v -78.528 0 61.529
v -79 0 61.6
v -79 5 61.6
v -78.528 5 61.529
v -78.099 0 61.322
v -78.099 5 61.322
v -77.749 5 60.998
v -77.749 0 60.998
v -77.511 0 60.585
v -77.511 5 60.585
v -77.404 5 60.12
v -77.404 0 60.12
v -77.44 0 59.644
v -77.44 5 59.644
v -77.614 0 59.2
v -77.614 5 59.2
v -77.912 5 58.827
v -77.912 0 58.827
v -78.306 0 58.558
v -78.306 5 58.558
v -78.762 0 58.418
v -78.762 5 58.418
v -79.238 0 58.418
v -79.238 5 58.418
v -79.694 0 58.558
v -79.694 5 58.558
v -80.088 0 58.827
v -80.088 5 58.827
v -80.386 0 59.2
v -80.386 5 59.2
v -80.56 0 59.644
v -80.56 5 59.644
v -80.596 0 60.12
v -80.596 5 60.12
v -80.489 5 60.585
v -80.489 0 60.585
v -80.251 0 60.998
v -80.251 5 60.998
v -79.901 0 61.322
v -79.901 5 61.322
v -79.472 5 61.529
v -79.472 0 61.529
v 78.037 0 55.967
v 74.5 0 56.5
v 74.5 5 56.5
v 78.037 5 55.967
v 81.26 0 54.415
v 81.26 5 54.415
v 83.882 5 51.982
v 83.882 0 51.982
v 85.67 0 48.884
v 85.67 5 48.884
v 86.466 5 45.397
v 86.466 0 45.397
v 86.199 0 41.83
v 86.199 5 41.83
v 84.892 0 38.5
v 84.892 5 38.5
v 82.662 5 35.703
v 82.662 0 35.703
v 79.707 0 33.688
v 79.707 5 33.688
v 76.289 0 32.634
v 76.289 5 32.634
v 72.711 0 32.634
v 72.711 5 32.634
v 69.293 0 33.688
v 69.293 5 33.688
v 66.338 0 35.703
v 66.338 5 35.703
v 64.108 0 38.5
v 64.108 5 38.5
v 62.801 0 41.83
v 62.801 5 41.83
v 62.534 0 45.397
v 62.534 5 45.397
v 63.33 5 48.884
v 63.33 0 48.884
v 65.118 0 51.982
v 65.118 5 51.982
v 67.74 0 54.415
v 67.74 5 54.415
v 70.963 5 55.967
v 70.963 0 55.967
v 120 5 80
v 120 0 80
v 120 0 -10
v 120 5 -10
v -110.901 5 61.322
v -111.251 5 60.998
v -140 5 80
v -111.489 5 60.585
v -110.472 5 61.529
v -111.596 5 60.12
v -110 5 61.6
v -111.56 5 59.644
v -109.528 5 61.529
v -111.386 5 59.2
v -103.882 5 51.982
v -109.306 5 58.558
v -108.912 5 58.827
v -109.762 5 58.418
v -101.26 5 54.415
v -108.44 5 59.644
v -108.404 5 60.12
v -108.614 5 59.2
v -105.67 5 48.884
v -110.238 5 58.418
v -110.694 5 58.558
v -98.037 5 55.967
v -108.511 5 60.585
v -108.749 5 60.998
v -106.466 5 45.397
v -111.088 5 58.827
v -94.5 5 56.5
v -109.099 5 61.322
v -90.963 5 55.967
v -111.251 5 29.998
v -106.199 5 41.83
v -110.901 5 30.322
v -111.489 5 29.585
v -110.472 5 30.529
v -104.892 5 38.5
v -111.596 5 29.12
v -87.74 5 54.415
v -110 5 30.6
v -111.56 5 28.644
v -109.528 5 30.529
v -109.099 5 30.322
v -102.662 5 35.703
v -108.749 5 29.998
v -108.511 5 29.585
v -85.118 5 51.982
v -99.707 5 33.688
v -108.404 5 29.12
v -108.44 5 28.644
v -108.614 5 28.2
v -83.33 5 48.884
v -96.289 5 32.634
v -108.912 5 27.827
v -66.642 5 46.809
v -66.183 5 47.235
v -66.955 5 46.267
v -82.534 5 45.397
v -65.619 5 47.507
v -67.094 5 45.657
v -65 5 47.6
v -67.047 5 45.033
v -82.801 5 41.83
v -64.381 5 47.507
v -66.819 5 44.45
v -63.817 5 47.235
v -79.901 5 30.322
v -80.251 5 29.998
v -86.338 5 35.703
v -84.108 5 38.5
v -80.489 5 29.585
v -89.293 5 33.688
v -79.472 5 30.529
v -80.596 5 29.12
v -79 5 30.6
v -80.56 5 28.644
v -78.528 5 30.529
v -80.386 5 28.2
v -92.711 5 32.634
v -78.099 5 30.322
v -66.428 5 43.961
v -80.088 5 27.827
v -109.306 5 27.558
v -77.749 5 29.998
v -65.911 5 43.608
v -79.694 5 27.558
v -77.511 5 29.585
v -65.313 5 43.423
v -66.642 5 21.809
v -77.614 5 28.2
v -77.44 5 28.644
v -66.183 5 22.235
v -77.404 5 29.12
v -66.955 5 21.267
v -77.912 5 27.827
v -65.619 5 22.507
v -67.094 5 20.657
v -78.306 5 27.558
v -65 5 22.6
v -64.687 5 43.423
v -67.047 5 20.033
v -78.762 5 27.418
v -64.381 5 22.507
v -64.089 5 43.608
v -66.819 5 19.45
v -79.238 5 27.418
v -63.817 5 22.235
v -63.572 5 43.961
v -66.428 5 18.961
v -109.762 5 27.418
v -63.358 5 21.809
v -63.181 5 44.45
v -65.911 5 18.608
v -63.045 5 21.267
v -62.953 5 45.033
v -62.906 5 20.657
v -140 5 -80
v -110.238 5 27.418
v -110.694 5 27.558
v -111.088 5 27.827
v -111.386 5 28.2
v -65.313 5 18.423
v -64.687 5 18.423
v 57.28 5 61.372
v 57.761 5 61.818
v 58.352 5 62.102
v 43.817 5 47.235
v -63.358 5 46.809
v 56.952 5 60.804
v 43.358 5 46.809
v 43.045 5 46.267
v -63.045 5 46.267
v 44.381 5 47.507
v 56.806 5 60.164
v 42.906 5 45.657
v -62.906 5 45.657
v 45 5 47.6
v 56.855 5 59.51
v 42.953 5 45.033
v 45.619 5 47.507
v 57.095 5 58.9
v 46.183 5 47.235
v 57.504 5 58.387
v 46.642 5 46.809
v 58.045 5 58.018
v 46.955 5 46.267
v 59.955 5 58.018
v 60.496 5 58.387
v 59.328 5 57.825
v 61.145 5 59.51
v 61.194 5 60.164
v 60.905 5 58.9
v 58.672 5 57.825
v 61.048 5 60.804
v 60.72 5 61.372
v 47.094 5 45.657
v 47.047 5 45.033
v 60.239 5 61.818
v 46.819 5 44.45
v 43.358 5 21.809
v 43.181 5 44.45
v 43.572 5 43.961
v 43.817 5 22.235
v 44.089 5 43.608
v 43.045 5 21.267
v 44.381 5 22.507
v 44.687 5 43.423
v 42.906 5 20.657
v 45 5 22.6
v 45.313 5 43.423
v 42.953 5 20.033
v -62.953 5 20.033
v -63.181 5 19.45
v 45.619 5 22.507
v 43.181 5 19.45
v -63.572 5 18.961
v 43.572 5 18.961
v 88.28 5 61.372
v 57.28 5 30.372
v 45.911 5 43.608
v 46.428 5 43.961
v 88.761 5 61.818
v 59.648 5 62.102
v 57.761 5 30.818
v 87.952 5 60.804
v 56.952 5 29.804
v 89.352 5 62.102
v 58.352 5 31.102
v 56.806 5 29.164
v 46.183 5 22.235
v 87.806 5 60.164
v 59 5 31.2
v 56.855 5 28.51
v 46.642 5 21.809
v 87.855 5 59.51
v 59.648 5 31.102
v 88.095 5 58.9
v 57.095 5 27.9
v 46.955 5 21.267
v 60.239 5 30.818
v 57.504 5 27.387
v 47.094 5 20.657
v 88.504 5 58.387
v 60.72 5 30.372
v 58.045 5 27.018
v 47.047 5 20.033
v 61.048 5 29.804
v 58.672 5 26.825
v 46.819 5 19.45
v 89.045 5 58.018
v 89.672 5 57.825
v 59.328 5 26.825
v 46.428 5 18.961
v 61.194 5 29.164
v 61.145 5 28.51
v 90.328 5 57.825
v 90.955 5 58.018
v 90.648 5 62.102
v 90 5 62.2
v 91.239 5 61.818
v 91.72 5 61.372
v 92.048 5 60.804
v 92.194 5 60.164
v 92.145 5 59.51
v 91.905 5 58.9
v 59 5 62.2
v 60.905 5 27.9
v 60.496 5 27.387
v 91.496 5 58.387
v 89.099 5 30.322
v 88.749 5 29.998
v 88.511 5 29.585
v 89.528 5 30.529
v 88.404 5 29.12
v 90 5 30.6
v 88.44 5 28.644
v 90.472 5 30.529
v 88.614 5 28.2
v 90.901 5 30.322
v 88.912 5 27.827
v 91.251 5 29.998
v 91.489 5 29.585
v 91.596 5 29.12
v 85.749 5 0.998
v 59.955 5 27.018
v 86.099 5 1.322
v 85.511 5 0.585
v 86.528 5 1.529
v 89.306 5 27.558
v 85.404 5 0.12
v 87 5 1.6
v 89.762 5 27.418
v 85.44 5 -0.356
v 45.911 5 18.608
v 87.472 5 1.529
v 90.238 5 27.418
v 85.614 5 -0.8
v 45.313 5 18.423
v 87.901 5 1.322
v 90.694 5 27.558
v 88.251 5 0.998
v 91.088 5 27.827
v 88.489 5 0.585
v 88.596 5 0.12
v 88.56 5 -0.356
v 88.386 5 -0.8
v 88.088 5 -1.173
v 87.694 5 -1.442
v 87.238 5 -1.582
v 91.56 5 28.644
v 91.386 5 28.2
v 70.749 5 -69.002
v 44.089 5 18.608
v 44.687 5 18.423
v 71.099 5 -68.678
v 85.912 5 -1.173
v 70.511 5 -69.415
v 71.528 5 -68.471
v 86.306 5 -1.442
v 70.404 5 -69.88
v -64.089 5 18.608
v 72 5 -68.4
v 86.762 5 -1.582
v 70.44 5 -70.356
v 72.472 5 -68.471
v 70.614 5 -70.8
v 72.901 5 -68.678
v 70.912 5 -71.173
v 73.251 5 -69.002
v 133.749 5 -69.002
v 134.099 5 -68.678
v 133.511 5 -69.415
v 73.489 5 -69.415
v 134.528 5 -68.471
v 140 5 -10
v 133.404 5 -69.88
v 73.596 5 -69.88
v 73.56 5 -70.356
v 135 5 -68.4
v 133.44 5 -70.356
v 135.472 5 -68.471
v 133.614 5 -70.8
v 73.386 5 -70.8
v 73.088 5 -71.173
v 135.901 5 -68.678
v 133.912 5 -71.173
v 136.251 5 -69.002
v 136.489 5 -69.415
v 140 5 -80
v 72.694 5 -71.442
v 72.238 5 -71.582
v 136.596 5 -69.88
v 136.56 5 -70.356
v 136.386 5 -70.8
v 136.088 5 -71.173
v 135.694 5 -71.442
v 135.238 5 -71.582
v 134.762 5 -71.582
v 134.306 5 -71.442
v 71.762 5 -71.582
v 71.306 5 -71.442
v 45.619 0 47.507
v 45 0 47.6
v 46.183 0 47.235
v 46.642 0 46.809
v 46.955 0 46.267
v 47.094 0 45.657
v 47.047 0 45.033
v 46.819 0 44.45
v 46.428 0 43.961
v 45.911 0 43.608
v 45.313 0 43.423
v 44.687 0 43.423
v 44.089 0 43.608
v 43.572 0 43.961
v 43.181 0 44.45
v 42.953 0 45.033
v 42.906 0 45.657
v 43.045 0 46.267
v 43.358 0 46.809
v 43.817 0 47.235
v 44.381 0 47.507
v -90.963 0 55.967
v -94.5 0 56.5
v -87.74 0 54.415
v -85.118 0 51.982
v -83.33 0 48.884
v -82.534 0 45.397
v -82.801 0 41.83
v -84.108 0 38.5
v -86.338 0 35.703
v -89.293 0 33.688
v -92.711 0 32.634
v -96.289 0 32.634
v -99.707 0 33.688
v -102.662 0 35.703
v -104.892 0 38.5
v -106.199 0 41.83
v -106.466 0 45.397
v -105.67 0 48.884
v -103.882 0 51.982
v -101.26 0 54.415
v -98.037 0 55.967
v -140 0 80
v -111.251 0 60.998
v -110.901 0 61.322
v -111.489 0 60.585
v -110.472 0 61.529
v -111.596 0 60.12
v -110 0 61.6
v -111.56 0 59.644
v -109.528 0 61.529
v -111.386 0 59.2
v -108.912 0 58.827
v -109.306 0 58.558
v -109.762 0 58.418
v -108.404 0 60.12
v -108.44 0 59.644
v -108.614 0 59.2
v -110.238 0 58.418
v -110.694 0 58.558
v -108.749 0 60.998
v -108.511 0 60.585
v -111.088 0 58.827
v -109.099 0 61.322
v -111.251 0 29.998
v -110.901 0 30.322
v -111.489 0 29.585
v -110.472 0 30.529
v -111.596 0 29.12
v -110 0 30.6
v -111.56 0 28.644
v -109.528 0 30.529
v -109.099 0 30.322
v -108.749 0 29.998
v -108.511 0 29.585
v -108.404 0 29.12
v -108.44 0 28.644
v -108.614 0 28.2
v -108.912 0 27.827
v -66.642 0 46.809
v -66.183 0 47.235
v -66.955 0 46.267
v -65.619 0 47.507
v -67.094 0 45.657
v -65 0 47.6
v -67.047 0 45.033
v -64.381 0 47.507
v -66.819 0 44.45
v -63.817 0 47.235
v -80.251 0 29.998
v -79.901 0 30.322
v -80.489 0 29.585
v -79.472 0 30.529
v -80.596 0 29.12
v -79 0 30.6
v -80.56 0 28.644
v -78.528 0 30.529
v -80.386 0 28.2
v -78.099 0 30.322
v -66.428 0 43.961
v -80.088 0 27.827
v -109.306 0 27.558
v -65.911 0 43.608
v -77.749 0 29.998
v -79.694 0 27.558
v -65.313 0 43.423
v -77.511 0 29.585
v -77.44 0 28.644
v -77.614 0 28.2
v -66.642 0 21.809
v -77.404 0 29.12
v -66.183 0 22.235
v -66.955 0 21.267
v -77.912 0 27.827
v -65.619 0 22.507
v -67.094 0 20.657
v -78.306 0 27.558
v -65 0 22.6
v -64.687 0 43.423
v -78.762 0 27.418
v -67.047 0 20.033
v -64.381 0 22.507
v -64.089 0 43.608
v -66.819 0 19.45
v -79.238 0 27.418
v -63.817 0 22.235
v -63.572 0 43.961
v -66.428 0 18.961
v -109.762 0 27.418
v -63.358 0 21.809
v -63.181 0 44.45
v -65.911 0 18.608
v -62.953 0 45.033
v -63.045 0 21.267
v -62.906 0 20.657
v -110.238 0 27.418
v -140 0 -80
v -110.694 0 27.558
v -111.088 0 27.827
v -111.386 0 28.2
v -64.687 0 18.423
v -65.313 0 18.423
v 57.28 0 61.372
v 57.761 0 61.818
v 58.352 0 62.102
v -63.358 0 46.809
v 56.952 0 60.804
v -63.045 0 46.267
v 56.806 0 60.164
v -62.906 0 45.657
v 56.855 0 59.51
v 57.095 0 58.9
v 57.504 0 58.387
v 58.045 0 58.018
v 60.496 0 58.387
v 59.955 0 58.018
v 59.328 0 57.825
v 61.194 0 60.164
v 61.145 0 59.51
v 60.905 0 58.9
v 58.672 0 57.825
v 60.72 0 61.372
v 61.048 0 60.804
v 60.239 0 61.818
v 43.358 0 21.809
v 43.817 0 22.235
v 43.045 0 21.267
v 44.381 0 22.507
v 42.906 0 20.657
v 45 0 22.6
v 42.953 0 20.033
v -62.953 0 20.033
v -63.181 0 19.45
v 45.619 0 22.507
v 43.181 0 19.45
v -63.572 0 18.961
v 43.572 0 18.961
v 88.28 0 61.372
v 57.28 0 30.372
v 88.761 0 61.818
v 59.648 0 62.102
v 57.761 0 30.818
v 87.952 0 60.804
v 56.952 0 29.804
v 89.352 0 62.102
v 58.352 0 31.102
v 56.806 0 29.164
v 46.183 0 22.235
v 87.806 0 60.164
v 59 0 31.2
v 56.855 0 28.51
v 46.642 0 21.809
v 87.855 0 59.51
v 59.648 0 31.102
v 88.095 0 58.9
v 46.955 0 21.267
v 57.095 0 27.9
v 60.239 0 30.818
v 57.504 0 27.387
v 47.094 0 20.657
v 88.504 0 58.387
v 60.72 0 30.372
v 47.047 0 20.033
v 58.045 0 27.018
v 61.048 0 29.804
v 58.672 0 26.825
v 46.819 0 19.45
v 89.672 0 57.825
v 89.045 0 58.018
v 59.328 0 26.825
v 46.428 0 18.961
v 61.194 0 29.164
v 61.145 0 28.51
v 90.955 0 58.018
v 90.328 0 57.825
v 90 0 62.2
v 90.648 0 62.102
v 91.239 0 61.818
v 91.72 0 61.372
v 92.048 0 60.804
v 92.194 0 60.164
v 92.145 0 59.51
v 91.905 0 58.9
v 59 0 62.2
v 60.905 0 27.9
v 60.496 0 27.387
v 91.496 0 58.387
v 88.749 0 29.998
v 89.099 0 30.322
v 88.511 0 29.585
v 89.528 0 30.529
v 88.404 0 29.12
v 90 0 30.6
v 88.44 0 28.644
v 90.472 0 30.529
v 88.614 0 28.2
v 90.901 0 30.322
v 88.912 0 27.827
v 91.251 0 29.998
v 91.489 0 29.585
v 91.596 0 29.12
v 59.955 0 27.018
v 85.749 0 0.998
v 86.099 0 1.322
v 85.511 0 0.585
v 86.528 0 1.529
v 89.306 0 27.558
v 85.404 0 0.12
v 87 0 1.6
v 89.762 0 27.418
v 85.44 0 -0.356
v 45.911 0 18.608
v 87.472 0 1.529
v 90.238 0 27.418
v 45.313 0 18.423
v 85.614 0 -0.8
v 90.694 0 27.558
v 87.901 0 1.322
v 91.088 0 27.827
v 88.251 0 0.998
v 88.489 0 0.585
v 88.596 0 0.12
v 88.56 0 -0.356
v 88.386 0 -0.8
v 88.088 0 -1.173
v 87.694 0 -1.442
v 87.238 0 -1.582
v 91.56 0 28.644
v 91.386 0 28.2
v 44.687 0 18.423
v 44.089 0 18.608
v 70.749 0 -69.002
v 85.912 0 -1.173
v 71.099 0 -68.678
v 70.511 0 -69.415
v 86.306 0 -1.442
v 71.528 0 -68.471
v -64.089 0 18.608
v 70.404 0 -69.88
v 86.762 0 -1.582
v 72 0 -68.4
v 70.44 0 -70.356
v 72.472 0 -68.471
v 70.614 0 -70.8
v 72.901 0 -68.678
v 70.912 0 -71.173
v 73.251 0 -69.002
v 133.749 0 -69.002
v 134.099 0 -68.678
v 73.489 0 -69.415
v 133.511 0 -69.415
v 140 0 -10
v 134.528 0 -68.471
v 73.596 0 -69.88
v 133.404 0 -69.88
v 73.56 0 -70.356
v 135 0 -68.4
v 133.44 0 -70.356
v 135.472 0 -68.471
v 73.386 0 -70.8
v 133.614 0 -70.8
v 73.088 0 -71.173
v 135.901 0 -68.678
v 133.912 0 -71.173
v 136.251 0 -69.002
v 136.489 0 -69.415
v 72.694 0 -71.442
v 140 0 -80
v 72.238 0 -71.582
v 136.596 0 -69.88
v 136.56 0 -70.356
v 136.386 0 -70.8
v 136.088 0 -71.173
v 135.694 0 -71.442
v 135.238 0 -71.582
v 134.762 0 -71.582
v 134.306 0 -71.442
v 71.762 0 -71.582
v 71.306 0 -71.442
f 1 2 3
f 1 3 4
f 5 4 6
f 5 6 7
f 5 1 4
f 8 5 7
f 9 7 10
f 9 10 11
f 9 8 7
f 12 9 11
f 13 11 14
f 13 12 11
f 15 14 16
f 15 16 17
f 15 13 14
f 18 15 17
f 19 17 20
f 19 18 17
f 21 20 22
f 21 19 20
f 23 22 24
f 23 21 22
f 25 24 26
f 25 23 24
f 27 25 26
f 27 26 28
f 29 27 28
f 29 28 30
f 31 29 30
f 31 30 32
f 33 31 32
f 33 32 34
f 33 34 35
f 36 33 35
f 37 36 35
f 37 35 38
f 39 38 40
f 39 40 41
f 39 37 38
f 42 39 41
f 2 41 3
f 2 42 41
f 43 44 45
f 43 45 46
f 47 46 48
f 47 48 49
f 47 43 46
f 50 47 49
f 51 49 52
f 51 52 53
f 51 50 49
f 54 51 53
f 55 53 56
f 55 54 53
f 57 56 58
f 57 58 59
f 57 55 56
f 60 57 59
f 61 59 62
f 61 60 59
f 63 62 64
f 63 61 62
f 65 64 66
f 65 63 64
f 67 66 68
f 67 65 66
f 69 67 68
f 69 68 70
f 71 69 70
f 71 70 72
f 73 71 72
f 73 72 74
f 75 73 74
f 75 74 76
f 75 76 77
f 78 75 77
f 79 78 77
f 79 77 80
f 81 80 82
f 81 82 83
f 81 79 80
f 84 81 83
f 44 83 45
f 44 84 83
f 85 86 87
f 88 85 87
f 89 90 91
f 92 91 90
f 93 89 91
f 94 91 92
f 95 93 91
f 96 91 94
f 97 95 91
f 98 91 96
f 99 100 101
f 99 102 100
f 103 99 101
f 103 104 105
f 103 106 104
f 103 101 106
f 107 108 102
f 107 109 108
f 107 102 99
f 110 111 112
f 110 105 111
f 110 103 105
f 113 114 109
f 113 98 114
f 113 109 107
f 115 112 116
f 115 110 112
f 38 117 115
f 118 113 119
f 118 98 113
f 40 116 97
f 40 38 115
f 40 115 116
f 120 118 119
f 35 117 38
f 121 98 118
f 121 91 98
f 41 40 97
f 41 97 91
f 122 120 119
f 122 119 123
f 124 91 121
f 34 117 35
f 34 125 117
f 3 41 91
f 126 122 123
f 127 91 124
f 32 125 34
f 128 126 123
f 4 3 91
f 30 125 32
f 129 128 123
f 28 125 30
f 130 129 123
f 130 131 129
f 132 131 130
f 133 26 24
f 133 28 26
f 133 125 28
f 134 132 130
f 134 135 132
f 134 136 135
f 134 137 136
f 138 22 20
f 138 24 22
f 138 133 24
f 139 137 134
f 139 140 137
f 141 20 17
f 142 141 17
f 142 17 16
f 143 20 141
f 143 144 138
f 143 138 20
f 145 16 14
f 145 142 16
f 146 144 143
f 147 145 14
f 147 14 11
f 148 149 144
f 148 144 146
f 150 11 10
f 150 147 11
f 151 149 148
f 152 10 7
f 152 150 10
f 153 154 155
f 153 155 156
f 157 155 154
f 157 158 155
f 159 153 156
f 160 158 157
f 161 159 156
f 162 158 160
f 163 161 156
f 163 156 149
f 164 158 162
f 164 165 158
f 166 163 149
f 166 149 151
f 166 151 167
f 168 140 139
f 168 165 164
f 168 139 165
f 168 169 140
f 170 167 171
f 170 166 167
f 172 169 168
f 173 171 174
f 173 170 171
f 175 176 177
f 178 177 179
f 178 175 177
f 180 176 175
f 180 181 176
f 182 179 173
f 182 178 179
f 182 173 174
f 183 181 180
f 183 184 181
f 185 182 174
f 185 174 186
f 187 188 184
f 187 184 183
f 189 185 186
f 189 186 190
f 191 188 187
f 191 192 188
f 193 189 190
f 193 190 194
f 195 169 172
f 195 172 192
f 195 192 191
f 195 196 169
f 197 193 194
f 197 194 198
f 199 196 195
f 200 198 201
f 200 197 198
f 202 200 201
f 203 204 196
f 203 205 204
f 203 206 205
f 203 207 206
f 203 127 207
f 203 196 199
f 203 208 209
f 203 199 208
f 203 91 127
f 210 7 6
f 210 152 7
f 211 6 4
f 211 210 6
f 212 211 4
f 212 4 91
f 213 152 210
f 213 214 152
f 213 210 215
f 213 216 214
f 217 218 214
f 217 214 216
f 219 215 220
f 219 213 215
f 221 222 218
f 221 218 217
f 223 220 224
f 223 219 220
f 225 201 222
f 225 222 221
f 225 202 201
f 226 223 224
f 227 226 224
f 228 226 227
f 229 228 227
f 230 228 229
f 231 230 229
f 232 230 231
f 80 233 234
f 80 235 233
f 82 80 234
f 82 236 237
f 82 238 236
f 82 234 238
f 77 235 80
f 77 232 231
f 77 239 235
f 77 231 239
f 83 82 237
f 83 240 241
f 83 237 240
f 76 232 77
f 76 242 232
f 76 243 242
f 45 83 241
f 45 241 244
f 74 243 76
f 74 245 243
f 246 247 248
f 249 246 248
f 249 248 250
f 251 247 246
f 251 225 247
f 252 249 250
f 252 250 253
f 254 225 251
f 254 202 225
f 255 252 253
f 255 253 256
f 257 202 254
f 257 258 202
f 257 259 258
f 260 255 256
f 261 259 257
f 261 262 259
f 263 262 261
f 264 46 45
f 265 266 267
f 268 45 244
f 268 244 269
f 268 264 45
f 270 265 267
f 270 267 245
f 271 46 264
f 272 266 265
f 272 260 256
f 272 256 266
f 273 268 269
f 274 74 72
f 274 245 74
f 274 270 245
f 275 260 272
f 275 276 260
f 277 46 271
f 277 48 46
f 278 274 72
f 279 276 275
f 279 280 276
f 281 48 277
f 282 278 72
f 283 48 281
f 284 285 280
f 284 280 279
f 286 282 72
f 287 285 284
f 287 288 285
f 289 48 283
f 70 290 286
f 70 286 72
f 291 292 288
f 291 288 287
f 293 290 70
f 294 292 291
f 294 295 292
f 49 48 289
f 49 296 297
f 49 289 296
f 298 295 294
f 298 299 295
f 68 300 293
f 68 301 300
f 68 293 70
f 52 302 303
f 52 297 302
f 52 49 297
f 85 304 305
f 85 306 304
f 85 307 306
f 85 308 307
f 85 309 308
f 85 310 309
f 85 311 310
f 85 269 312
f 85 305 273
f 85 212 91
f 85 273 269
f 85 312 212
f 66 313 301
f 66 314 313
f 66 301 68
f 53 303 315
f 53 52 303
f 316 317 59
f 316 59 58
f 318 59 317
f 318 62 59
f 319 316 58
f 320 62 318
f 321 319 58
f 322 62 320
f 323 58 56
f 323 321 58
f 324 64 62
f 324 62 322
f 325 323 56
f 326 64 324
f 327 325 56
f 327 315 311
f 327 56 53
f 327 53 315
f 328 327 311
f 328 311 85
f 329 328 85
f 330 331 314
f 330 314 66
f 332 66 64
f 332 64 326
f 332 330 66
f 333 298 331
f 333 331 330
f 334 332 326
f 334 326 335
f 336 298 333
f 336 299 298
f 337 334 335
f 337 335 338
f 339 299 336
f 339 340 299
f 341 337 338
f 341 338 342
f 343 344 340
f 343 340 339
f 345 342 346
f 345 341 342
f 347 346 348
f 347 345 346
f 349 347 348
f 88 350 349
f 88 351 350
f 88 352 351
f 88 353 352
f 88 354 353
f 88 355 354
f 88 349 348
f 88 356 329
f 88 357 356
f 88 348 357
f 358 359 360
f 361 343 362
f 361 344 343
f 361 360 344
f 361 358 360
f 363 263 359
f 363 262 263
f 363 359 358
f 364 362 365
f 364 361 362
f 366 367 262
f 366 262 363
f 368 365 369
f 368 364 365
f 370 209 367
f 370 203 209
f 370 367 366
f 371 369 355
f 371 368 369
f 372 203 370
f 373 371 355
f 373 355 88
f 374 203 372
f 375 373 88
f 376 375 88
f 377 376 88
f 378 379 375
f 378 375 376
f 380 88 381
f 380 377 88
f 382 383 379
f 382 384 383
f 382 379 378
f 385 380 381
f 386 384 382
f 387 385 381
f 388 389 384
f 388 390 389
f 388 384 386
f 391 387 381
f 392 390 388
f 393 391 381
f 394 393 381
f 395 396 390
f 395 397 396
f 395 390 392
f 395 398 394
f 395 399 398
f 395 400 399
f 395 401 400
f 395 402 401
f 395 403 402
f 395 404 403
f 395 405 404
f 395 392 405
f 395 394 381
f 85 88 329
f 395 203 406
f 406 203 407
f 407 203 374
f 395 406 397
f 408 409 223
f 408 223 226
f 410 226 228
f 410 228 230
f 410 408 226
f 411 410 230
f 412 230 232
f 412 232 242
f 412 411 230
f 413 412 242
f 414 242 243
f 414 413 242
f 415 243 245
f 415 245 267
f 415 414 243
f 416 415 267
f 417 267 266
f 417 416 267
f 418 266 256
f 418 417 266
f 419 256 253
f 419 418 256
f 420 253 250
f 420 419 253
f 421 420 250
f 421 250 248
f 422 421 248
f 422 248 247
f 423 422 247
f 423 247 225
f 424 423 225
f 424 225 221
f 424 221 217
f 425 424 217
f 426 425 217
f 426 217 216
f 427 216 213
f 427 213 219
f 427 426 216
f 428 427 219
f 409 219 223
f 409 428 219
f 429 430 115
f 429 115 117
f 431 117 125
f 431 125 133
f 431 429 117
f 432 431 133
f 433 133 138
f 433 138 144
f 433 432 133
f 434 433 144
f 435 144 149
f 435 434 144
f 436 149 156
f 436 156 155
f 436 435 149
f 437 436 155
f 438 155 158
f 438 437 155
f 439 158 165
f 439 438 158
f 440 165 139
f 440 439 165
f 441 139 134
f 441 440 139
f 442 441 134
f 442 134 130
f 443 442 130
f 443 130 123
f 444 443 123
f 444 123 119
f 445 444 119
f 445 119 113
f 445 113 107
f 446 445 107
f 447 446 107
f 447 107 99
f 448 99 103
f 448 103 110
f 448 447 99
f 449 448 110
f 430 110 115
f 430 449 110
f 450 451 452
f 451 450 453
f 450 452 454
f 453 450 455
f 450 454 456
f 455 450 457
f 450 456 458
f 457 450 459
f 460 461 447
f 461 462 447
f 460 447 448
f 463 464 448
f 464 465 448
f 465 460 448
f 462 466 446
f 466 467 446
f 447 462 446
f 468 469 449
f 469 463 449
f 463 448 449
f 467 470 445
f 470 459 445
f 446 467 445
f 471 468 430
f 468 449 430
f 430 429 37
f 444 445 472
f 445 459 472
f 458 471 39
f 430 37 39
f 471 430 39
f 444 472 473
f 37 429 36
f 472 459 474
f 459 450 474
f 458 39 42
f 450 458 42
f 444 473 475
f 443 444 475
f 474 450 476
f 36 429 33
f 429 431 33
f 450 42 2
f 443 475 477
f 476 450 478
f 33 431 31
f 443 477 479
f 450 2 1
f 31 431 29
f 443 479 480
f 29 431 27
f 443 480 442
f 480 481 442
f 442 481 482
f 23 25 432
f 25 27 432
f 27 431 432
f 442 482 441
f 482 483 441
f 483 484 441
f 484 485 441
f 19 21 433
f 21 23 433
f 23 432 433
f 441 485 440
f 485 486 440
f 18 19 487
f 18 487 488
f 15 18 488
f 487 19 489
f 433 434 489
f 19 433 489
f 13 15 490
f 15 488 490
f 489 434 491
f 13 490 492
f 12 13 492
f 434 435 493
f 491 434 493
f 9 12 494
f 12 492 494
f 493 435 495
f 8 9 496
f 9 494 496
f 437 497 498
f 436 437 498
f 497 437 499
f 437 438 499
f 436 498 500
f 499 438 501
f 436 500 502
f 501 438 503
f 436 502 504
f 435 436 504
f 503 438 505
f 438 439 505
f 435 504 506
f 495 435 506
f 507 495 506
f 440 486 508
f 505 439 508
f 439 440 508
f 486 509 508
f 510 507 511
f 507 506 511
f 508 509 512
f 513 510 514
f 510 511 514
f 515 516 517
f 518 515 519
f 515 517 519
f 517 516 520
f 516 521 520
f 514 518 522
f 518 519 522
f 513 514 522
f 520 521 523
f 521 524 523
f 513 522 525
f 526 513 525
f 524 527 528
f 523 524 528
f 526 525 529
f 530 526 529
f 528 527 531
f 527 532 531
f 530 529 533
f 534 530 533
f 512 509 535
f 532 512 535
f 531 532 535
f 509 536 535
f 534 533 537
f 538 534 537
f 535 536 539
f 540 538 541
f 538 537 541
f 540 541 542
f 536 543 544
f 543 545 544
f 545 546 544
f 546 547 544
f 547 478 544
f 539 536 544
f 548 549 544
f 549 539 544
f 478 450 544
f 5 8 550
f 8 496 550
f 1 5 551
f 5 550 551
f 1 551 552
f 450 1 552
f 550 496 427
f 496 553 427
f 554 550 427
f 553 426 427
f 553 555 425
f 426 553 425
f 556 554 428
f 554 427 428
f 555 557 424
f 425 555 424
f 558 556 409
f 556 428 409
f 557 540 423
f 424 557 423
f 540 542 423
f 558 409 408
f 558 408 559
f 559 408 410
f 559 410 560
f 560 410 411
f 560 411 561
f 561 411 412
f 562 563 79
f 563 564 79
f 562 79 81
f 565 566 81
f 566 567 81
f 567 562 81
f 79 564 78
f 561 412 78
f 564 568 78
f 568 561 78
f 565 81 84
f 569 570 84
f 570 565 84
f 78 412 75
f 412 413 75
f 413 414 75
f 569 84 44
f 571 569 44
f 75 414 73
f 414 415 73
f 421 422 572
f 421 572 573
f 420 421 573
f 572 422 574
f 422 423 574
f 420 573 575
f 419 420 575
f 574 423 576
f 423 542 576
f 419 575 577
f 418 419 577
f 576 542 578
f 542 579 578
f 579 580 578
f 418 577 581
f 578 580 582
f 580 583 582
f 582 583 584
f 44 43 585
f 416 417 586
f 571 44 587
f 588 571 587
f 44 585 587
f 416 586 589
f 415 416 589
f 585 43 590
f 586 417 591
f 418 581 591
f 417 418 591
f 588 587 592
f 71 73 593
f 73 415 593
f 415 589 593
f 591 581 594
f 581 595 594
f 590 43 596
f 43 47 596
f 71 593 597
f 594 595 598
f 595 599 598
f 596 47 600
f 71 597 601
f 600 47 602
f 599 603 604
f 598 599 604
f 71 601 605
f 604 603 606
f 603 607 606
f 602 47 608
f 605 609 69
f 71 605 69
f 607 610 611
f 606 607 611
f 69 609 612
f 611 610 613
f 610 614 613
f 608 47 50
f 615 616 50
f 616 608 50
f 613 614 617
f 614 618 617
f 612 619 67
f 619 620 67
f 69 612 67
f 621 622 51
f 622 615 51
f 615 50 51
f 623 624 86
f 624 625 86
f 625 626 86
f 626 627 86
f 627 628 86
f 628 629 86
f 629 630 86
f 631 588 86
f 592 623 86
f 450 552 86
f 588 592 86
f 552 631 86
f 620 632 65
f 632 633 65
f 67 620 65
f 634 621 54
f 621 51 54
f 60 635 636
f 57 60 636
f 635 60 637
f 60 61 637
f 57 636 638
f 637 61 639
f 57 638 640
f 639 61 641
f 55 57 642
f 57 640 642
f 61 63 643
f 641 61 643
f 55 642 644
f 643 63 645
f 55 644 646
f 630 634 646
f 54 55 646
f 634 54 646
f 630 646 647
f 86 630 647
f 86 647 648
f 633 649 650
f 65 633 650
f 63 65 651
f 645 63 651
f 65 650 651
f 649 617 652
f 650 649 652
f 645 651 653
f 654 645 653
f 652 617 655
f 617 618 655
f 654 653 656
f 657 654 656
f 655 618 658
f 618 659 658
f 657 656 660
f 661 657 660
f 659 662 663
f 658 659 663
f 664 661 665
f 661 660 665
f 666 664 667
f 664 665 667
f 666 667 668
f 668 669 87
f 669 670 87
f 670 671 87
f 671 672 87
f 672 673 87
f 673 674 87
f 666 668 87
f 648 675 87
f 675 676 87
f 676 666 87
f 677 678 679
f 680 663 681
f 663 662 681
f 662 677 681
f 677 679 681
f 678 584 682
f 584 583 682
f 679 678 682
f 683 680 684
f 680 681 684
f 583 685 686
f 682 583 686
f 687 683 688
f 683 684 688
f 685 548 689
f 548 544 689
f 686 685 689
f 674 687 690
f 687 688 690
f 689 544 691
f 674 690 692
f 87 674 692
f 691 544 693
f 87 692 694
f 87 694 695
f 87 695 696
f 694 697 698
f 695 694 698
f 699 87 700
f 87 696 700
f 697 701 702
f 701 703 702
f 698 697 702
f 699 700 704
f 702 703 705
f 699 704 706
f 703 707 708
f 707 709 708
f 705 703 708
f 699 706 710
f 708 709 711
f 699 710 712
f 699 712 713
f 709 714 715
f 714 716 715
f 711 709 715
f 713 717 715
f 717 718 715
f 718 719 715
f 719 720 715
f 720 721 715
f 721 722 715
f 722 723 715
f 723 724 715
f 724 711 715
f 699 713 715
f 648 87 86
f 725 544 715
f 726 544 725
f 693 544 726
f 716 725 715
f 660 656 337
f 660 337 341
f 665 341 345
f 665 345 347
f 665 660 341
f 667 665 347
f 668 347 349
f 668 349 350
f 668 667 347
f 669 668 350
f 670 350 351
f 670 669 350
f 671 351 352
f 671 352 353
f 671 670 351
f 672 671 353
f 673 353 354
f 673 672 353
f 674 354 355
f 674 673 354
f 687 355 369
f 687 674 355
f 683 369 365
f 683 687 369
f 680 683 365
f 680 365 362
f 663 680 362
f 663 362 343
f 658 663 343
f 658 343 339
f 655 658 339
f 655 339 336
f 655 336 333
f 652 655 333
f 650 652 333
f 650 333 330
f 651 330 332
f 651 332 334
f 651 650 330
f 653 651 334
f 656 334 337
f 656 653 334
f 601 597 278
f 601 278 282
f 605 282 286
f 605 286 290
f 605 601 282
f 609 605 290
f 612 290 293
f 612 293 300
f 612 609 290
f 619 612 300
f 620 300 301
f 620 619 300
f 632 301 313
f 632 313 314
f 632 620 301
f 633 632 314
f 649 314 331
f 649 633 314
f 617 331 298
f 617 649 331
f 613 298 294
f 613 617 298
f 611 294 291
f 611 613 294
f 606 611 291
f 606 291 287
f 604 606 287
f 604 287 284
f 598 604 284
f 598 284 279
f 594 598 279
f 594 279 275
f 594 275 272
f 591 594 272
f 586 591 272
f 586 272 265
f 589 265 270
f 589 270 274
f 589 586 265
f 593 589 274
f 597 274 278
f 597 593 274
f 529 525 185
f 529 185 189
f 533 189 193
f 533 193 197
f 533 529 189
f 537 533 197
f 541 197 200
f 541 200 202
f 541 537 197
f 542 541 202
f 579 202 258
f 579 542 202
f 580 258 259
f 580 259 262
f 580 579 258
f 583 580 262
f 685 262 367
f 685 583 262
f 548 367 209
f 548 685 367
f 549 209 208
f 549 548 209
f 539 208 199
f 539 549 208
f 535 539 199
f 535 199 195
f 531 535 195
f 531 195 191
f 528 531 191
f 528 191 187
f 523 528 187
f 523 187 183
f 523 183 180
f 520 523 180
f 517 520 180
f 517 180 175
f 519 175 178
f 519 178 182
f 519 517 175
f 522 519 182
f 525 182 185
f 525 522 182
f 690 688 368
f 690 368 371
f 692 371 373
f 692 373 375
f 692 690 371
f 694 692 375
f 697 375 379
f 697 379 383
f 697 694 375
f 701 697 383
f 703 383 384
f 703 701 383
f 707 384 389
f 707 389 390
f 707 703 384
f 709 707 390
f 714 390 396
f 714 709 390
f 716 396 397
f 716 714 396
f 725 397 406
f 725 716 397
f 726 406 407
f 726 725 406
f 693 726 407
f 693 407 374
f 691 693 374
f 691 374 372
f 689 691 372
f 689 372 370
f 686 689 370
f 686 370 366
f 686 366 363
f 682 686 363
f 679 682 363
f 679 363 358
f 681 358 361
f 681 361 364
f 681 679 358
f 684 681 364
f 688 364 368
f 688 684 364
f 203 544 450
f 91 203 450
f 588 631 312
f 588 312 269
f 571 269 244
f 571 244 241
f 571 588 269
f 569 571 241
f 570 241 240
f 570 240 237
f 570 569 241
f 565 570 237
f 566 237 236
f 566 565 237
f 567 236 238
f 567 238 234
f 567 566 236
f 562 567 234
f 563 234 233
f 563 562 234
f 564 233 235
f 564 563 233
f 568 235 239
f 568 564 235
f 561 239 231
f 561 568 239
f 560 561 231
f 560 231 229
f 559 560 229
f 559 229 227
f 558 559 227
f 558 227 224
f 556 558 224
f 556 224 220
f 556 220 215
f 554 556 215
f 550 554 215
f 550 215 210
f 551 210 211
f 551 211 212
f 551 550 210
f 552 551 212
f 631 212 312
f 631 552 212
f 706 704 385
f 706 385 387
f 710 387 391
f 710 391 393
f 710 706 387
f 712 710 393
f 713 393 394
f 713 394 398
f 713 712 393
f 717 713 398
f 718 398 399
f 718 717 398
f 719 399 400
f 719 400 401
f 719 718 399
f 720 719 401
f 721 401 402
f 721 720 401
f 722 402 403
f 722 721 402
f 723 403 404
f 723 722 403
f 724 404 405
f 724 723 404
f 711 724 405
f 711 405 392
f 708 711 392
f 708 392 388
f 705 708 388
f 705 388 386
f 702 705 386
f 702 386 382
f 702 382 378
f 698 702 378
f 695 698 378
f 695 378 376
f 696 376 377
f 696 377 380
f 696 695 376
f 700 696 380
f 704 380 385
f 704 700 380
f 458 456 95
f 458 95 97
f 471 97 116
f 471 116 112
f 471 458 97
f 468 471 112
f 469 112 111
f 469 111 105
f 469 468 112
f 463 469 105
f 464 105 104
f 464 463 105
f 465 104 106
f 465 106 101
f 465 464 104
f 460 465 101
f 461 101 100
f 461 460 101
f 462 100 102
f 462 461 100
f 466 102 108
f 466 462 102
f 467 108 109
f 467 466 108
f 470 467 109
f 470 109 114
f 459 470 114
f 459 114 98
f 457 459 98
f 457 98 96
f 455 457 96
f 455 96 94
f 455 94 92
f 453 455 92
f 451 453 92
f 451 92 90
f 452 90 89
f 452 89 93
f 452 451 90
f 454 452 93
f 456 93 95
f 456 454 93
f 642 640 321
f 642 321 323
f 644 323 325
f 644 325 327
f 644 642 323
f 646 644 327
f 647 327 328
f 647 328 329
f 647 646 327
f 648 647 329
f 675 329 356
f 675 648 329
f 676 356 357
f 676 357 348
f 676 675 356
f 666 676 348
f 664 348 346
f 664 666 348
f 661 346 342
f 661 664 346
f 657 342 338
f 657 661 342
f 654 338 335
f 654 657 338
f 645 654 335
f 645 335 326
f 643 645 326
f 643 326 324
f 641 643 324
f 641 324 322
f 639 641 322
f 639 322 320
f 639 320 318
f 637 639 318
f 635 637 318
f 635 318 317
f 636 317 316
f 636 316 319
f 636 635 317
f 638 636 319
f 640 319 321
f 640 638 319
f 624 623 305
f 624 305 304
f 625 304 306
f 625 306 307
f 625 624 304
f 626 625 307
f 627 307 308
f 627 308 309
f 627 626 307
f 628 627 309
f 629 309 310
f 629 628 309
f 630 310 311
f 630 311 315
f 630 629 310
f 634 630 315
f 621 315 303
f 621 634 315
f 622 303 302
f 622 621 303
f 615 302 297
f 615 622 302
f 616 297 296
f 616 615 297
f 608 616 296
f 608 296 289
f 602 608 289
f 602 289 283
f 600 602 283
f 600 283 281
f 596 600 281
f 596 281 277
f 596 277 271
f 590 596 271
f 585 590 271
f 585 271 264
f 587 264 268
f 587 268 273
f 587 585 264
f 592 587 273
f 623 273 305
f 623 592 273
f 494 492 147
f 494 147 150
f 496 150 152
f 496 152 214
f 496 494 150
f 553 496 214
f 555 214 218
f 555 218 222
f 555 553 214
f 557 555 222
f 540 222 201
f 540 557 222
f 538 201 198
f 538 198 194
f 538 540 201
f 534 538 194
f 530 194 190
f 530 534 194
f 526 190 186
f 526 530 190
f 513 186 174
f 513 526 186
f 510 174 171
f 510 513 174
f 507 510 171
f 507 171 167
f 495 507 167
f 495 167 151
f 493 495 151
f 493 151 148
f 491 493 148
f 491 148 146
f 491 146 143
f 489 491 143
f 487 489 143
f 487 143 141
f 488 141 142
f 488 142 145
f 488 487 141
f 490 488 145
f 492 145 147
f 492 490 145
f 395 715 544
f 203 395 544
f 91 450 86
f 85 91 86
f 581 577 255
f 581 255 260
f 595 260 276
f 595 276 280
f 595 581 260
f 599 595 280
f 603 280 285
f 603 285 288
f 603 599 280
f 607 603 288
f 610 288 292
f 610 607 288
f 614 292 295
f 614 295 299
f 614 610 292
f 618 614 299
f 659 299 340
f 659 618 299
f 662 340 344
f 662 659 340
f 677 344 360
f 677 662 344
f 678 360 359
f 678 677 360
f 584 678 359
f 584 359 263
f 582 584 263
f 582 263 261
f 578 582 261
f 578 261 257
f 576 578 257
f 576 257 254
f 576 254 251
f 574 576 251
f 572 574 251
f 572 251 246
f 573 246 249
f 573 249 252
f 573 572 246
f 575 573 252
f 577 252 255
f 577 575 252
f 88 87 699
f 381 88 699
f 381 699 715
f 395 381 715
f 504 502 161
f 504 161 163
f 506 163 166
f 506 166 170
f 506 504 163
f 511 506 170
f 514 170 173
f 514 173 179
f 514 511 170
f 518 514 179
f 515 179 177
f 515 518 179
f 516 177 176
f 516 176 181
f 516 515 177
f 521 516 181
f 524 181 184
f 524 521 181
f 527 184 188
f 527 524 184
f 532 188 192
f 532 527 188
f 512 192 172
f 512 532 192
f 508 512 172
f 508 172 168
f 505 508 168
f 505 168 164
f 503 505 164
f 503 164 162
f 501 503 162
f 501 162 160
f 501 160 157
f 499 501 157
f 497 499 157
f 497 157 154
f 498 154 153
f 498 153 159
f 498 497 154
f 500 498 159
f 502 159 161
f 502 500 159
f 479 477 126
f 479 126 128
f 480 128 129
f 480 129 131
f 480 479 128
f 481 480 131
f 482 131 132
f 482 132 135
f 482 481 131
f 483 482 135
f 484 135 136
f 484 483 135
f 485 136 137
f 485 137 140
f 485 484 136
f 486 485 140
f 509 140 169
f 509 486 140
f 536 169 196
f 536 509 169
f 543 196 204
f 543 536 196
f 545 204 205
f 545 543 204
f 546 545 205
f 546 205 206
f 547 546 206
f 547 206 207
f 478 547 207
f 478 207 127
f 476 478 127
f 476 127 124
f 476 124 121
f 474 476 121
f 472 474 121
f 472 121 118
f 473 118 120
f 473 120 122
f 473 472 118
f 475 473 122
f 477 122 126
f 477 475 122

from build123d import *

# Parameters (mm, degrees)
SKETCH_1_R      = 1.6
SKETCH_1_R_2    = 12
SKETCH_1_R_3    = 2.1
SKETCH_1_R_4    = 2.2
EXTRUDE_1_DEPTH = 5


with BuildPart() as part:
    # 草图1 → 凸台-拉伸1 (new body)
    with BuildSketch(Plane(origin=(0, 0, 0), x_dir=(1, 0, 0), z_dir=(0, 1, 0))):
        Polygon((-140, 80), (-140, -80), (120, -80), (120, 10), (140, 10), (140, 80), align=None)
        with Locations(Location((-110, -60, 0), (0, 0, 270))):
            Circle(SKETCH_1_R, mode=Mode.SUBTRACT)
        with Locations(Location((-79, -60, 0), (0, 0, 270))):
            Circle(SKETCH_1_R, mode=Mode.SUBTRACT)
        with Locations(Location((-94.5, -44.5, 0), (0, 0, 270))):
            Circle(SKETCH_1_R_2, mode=Mode.SUBTRACT)
        with Locations(Location((-65, -45.5, 0), (0, 0, 270))):
            Circle(SKETCH_1_R_3, mode=Mode.SUBTRACT)
        with Locations(Location((-110, -29, 0), (0, 0, 270))):
            Circle(SKETCH_1_R, mode=Mode.SUBTRACT)
        with Locations(Location((-79, -29, 0), (0, 0, 270))):
            Circle(SKETCH_1_R, mode=Mode.SUBTRACT)
        with Locations(Location((-65, -20.5, 0), (0, 0, 270))):
            Circle(SKETCH_1_R_3, mode=Mode.SUBTRACT)
        with Locations(Location((59, -60, 0), (0, 0, 270))):
            Circle(SKETCH_1_R_4, mode=Mode.SUBTRACT)
        with Locations(Location((45, -45.5, 0), (0, 0, 270))):
            Circle(SKETCH_1_R_3, mode=Mode.SUBTRACT)
        with Locations(Location((90, -60, 0), (0, 0, 270))):
            Circle(SKETCH_1_R_4, mode=Mode.SUBTRACT)
        with Locations(Location((74.5, -44.5, 0), (0, 0, 270))):
            Circle(SKETCH_1_R_2, mode=Mode.SUBTRACT)
        with Locations(Location((45, -20.5, 0), (0, 0, 270))):
            Circle(SKETCH_1_R_3, mode=Mode.SUBTRACT)
        with Locations(Location((59, -29, 0), (0, 0, 270))):
            Circle(SKETCH_1_R_4, mode=Mode.SUBTRACT)
        with Locations(Location((90, -29, 0), (0, 0, 270))):
            Circle(SKETCH_1_R, mode=Mode.SUBTRACT)
        with Locations(Location((87, 0, 0), (0, 0, 270))):
            Circle(SKETCH_1_R, mode=Mode.SUBTRACT)
        with Locations(Location((72, 70, 0), (0, 0, 270))):
            Circle(SKETCH_1_R, mode=Mode.SUBTRACT)
        with Locations(Location((135, 70, 0), (0, 0, 270))):
            Circle(SKETCH_1_R, mode=Mode.SUBTRACT)
    extrude(amount=EXTRUDE_1_DEPTH)


solid = part.part
